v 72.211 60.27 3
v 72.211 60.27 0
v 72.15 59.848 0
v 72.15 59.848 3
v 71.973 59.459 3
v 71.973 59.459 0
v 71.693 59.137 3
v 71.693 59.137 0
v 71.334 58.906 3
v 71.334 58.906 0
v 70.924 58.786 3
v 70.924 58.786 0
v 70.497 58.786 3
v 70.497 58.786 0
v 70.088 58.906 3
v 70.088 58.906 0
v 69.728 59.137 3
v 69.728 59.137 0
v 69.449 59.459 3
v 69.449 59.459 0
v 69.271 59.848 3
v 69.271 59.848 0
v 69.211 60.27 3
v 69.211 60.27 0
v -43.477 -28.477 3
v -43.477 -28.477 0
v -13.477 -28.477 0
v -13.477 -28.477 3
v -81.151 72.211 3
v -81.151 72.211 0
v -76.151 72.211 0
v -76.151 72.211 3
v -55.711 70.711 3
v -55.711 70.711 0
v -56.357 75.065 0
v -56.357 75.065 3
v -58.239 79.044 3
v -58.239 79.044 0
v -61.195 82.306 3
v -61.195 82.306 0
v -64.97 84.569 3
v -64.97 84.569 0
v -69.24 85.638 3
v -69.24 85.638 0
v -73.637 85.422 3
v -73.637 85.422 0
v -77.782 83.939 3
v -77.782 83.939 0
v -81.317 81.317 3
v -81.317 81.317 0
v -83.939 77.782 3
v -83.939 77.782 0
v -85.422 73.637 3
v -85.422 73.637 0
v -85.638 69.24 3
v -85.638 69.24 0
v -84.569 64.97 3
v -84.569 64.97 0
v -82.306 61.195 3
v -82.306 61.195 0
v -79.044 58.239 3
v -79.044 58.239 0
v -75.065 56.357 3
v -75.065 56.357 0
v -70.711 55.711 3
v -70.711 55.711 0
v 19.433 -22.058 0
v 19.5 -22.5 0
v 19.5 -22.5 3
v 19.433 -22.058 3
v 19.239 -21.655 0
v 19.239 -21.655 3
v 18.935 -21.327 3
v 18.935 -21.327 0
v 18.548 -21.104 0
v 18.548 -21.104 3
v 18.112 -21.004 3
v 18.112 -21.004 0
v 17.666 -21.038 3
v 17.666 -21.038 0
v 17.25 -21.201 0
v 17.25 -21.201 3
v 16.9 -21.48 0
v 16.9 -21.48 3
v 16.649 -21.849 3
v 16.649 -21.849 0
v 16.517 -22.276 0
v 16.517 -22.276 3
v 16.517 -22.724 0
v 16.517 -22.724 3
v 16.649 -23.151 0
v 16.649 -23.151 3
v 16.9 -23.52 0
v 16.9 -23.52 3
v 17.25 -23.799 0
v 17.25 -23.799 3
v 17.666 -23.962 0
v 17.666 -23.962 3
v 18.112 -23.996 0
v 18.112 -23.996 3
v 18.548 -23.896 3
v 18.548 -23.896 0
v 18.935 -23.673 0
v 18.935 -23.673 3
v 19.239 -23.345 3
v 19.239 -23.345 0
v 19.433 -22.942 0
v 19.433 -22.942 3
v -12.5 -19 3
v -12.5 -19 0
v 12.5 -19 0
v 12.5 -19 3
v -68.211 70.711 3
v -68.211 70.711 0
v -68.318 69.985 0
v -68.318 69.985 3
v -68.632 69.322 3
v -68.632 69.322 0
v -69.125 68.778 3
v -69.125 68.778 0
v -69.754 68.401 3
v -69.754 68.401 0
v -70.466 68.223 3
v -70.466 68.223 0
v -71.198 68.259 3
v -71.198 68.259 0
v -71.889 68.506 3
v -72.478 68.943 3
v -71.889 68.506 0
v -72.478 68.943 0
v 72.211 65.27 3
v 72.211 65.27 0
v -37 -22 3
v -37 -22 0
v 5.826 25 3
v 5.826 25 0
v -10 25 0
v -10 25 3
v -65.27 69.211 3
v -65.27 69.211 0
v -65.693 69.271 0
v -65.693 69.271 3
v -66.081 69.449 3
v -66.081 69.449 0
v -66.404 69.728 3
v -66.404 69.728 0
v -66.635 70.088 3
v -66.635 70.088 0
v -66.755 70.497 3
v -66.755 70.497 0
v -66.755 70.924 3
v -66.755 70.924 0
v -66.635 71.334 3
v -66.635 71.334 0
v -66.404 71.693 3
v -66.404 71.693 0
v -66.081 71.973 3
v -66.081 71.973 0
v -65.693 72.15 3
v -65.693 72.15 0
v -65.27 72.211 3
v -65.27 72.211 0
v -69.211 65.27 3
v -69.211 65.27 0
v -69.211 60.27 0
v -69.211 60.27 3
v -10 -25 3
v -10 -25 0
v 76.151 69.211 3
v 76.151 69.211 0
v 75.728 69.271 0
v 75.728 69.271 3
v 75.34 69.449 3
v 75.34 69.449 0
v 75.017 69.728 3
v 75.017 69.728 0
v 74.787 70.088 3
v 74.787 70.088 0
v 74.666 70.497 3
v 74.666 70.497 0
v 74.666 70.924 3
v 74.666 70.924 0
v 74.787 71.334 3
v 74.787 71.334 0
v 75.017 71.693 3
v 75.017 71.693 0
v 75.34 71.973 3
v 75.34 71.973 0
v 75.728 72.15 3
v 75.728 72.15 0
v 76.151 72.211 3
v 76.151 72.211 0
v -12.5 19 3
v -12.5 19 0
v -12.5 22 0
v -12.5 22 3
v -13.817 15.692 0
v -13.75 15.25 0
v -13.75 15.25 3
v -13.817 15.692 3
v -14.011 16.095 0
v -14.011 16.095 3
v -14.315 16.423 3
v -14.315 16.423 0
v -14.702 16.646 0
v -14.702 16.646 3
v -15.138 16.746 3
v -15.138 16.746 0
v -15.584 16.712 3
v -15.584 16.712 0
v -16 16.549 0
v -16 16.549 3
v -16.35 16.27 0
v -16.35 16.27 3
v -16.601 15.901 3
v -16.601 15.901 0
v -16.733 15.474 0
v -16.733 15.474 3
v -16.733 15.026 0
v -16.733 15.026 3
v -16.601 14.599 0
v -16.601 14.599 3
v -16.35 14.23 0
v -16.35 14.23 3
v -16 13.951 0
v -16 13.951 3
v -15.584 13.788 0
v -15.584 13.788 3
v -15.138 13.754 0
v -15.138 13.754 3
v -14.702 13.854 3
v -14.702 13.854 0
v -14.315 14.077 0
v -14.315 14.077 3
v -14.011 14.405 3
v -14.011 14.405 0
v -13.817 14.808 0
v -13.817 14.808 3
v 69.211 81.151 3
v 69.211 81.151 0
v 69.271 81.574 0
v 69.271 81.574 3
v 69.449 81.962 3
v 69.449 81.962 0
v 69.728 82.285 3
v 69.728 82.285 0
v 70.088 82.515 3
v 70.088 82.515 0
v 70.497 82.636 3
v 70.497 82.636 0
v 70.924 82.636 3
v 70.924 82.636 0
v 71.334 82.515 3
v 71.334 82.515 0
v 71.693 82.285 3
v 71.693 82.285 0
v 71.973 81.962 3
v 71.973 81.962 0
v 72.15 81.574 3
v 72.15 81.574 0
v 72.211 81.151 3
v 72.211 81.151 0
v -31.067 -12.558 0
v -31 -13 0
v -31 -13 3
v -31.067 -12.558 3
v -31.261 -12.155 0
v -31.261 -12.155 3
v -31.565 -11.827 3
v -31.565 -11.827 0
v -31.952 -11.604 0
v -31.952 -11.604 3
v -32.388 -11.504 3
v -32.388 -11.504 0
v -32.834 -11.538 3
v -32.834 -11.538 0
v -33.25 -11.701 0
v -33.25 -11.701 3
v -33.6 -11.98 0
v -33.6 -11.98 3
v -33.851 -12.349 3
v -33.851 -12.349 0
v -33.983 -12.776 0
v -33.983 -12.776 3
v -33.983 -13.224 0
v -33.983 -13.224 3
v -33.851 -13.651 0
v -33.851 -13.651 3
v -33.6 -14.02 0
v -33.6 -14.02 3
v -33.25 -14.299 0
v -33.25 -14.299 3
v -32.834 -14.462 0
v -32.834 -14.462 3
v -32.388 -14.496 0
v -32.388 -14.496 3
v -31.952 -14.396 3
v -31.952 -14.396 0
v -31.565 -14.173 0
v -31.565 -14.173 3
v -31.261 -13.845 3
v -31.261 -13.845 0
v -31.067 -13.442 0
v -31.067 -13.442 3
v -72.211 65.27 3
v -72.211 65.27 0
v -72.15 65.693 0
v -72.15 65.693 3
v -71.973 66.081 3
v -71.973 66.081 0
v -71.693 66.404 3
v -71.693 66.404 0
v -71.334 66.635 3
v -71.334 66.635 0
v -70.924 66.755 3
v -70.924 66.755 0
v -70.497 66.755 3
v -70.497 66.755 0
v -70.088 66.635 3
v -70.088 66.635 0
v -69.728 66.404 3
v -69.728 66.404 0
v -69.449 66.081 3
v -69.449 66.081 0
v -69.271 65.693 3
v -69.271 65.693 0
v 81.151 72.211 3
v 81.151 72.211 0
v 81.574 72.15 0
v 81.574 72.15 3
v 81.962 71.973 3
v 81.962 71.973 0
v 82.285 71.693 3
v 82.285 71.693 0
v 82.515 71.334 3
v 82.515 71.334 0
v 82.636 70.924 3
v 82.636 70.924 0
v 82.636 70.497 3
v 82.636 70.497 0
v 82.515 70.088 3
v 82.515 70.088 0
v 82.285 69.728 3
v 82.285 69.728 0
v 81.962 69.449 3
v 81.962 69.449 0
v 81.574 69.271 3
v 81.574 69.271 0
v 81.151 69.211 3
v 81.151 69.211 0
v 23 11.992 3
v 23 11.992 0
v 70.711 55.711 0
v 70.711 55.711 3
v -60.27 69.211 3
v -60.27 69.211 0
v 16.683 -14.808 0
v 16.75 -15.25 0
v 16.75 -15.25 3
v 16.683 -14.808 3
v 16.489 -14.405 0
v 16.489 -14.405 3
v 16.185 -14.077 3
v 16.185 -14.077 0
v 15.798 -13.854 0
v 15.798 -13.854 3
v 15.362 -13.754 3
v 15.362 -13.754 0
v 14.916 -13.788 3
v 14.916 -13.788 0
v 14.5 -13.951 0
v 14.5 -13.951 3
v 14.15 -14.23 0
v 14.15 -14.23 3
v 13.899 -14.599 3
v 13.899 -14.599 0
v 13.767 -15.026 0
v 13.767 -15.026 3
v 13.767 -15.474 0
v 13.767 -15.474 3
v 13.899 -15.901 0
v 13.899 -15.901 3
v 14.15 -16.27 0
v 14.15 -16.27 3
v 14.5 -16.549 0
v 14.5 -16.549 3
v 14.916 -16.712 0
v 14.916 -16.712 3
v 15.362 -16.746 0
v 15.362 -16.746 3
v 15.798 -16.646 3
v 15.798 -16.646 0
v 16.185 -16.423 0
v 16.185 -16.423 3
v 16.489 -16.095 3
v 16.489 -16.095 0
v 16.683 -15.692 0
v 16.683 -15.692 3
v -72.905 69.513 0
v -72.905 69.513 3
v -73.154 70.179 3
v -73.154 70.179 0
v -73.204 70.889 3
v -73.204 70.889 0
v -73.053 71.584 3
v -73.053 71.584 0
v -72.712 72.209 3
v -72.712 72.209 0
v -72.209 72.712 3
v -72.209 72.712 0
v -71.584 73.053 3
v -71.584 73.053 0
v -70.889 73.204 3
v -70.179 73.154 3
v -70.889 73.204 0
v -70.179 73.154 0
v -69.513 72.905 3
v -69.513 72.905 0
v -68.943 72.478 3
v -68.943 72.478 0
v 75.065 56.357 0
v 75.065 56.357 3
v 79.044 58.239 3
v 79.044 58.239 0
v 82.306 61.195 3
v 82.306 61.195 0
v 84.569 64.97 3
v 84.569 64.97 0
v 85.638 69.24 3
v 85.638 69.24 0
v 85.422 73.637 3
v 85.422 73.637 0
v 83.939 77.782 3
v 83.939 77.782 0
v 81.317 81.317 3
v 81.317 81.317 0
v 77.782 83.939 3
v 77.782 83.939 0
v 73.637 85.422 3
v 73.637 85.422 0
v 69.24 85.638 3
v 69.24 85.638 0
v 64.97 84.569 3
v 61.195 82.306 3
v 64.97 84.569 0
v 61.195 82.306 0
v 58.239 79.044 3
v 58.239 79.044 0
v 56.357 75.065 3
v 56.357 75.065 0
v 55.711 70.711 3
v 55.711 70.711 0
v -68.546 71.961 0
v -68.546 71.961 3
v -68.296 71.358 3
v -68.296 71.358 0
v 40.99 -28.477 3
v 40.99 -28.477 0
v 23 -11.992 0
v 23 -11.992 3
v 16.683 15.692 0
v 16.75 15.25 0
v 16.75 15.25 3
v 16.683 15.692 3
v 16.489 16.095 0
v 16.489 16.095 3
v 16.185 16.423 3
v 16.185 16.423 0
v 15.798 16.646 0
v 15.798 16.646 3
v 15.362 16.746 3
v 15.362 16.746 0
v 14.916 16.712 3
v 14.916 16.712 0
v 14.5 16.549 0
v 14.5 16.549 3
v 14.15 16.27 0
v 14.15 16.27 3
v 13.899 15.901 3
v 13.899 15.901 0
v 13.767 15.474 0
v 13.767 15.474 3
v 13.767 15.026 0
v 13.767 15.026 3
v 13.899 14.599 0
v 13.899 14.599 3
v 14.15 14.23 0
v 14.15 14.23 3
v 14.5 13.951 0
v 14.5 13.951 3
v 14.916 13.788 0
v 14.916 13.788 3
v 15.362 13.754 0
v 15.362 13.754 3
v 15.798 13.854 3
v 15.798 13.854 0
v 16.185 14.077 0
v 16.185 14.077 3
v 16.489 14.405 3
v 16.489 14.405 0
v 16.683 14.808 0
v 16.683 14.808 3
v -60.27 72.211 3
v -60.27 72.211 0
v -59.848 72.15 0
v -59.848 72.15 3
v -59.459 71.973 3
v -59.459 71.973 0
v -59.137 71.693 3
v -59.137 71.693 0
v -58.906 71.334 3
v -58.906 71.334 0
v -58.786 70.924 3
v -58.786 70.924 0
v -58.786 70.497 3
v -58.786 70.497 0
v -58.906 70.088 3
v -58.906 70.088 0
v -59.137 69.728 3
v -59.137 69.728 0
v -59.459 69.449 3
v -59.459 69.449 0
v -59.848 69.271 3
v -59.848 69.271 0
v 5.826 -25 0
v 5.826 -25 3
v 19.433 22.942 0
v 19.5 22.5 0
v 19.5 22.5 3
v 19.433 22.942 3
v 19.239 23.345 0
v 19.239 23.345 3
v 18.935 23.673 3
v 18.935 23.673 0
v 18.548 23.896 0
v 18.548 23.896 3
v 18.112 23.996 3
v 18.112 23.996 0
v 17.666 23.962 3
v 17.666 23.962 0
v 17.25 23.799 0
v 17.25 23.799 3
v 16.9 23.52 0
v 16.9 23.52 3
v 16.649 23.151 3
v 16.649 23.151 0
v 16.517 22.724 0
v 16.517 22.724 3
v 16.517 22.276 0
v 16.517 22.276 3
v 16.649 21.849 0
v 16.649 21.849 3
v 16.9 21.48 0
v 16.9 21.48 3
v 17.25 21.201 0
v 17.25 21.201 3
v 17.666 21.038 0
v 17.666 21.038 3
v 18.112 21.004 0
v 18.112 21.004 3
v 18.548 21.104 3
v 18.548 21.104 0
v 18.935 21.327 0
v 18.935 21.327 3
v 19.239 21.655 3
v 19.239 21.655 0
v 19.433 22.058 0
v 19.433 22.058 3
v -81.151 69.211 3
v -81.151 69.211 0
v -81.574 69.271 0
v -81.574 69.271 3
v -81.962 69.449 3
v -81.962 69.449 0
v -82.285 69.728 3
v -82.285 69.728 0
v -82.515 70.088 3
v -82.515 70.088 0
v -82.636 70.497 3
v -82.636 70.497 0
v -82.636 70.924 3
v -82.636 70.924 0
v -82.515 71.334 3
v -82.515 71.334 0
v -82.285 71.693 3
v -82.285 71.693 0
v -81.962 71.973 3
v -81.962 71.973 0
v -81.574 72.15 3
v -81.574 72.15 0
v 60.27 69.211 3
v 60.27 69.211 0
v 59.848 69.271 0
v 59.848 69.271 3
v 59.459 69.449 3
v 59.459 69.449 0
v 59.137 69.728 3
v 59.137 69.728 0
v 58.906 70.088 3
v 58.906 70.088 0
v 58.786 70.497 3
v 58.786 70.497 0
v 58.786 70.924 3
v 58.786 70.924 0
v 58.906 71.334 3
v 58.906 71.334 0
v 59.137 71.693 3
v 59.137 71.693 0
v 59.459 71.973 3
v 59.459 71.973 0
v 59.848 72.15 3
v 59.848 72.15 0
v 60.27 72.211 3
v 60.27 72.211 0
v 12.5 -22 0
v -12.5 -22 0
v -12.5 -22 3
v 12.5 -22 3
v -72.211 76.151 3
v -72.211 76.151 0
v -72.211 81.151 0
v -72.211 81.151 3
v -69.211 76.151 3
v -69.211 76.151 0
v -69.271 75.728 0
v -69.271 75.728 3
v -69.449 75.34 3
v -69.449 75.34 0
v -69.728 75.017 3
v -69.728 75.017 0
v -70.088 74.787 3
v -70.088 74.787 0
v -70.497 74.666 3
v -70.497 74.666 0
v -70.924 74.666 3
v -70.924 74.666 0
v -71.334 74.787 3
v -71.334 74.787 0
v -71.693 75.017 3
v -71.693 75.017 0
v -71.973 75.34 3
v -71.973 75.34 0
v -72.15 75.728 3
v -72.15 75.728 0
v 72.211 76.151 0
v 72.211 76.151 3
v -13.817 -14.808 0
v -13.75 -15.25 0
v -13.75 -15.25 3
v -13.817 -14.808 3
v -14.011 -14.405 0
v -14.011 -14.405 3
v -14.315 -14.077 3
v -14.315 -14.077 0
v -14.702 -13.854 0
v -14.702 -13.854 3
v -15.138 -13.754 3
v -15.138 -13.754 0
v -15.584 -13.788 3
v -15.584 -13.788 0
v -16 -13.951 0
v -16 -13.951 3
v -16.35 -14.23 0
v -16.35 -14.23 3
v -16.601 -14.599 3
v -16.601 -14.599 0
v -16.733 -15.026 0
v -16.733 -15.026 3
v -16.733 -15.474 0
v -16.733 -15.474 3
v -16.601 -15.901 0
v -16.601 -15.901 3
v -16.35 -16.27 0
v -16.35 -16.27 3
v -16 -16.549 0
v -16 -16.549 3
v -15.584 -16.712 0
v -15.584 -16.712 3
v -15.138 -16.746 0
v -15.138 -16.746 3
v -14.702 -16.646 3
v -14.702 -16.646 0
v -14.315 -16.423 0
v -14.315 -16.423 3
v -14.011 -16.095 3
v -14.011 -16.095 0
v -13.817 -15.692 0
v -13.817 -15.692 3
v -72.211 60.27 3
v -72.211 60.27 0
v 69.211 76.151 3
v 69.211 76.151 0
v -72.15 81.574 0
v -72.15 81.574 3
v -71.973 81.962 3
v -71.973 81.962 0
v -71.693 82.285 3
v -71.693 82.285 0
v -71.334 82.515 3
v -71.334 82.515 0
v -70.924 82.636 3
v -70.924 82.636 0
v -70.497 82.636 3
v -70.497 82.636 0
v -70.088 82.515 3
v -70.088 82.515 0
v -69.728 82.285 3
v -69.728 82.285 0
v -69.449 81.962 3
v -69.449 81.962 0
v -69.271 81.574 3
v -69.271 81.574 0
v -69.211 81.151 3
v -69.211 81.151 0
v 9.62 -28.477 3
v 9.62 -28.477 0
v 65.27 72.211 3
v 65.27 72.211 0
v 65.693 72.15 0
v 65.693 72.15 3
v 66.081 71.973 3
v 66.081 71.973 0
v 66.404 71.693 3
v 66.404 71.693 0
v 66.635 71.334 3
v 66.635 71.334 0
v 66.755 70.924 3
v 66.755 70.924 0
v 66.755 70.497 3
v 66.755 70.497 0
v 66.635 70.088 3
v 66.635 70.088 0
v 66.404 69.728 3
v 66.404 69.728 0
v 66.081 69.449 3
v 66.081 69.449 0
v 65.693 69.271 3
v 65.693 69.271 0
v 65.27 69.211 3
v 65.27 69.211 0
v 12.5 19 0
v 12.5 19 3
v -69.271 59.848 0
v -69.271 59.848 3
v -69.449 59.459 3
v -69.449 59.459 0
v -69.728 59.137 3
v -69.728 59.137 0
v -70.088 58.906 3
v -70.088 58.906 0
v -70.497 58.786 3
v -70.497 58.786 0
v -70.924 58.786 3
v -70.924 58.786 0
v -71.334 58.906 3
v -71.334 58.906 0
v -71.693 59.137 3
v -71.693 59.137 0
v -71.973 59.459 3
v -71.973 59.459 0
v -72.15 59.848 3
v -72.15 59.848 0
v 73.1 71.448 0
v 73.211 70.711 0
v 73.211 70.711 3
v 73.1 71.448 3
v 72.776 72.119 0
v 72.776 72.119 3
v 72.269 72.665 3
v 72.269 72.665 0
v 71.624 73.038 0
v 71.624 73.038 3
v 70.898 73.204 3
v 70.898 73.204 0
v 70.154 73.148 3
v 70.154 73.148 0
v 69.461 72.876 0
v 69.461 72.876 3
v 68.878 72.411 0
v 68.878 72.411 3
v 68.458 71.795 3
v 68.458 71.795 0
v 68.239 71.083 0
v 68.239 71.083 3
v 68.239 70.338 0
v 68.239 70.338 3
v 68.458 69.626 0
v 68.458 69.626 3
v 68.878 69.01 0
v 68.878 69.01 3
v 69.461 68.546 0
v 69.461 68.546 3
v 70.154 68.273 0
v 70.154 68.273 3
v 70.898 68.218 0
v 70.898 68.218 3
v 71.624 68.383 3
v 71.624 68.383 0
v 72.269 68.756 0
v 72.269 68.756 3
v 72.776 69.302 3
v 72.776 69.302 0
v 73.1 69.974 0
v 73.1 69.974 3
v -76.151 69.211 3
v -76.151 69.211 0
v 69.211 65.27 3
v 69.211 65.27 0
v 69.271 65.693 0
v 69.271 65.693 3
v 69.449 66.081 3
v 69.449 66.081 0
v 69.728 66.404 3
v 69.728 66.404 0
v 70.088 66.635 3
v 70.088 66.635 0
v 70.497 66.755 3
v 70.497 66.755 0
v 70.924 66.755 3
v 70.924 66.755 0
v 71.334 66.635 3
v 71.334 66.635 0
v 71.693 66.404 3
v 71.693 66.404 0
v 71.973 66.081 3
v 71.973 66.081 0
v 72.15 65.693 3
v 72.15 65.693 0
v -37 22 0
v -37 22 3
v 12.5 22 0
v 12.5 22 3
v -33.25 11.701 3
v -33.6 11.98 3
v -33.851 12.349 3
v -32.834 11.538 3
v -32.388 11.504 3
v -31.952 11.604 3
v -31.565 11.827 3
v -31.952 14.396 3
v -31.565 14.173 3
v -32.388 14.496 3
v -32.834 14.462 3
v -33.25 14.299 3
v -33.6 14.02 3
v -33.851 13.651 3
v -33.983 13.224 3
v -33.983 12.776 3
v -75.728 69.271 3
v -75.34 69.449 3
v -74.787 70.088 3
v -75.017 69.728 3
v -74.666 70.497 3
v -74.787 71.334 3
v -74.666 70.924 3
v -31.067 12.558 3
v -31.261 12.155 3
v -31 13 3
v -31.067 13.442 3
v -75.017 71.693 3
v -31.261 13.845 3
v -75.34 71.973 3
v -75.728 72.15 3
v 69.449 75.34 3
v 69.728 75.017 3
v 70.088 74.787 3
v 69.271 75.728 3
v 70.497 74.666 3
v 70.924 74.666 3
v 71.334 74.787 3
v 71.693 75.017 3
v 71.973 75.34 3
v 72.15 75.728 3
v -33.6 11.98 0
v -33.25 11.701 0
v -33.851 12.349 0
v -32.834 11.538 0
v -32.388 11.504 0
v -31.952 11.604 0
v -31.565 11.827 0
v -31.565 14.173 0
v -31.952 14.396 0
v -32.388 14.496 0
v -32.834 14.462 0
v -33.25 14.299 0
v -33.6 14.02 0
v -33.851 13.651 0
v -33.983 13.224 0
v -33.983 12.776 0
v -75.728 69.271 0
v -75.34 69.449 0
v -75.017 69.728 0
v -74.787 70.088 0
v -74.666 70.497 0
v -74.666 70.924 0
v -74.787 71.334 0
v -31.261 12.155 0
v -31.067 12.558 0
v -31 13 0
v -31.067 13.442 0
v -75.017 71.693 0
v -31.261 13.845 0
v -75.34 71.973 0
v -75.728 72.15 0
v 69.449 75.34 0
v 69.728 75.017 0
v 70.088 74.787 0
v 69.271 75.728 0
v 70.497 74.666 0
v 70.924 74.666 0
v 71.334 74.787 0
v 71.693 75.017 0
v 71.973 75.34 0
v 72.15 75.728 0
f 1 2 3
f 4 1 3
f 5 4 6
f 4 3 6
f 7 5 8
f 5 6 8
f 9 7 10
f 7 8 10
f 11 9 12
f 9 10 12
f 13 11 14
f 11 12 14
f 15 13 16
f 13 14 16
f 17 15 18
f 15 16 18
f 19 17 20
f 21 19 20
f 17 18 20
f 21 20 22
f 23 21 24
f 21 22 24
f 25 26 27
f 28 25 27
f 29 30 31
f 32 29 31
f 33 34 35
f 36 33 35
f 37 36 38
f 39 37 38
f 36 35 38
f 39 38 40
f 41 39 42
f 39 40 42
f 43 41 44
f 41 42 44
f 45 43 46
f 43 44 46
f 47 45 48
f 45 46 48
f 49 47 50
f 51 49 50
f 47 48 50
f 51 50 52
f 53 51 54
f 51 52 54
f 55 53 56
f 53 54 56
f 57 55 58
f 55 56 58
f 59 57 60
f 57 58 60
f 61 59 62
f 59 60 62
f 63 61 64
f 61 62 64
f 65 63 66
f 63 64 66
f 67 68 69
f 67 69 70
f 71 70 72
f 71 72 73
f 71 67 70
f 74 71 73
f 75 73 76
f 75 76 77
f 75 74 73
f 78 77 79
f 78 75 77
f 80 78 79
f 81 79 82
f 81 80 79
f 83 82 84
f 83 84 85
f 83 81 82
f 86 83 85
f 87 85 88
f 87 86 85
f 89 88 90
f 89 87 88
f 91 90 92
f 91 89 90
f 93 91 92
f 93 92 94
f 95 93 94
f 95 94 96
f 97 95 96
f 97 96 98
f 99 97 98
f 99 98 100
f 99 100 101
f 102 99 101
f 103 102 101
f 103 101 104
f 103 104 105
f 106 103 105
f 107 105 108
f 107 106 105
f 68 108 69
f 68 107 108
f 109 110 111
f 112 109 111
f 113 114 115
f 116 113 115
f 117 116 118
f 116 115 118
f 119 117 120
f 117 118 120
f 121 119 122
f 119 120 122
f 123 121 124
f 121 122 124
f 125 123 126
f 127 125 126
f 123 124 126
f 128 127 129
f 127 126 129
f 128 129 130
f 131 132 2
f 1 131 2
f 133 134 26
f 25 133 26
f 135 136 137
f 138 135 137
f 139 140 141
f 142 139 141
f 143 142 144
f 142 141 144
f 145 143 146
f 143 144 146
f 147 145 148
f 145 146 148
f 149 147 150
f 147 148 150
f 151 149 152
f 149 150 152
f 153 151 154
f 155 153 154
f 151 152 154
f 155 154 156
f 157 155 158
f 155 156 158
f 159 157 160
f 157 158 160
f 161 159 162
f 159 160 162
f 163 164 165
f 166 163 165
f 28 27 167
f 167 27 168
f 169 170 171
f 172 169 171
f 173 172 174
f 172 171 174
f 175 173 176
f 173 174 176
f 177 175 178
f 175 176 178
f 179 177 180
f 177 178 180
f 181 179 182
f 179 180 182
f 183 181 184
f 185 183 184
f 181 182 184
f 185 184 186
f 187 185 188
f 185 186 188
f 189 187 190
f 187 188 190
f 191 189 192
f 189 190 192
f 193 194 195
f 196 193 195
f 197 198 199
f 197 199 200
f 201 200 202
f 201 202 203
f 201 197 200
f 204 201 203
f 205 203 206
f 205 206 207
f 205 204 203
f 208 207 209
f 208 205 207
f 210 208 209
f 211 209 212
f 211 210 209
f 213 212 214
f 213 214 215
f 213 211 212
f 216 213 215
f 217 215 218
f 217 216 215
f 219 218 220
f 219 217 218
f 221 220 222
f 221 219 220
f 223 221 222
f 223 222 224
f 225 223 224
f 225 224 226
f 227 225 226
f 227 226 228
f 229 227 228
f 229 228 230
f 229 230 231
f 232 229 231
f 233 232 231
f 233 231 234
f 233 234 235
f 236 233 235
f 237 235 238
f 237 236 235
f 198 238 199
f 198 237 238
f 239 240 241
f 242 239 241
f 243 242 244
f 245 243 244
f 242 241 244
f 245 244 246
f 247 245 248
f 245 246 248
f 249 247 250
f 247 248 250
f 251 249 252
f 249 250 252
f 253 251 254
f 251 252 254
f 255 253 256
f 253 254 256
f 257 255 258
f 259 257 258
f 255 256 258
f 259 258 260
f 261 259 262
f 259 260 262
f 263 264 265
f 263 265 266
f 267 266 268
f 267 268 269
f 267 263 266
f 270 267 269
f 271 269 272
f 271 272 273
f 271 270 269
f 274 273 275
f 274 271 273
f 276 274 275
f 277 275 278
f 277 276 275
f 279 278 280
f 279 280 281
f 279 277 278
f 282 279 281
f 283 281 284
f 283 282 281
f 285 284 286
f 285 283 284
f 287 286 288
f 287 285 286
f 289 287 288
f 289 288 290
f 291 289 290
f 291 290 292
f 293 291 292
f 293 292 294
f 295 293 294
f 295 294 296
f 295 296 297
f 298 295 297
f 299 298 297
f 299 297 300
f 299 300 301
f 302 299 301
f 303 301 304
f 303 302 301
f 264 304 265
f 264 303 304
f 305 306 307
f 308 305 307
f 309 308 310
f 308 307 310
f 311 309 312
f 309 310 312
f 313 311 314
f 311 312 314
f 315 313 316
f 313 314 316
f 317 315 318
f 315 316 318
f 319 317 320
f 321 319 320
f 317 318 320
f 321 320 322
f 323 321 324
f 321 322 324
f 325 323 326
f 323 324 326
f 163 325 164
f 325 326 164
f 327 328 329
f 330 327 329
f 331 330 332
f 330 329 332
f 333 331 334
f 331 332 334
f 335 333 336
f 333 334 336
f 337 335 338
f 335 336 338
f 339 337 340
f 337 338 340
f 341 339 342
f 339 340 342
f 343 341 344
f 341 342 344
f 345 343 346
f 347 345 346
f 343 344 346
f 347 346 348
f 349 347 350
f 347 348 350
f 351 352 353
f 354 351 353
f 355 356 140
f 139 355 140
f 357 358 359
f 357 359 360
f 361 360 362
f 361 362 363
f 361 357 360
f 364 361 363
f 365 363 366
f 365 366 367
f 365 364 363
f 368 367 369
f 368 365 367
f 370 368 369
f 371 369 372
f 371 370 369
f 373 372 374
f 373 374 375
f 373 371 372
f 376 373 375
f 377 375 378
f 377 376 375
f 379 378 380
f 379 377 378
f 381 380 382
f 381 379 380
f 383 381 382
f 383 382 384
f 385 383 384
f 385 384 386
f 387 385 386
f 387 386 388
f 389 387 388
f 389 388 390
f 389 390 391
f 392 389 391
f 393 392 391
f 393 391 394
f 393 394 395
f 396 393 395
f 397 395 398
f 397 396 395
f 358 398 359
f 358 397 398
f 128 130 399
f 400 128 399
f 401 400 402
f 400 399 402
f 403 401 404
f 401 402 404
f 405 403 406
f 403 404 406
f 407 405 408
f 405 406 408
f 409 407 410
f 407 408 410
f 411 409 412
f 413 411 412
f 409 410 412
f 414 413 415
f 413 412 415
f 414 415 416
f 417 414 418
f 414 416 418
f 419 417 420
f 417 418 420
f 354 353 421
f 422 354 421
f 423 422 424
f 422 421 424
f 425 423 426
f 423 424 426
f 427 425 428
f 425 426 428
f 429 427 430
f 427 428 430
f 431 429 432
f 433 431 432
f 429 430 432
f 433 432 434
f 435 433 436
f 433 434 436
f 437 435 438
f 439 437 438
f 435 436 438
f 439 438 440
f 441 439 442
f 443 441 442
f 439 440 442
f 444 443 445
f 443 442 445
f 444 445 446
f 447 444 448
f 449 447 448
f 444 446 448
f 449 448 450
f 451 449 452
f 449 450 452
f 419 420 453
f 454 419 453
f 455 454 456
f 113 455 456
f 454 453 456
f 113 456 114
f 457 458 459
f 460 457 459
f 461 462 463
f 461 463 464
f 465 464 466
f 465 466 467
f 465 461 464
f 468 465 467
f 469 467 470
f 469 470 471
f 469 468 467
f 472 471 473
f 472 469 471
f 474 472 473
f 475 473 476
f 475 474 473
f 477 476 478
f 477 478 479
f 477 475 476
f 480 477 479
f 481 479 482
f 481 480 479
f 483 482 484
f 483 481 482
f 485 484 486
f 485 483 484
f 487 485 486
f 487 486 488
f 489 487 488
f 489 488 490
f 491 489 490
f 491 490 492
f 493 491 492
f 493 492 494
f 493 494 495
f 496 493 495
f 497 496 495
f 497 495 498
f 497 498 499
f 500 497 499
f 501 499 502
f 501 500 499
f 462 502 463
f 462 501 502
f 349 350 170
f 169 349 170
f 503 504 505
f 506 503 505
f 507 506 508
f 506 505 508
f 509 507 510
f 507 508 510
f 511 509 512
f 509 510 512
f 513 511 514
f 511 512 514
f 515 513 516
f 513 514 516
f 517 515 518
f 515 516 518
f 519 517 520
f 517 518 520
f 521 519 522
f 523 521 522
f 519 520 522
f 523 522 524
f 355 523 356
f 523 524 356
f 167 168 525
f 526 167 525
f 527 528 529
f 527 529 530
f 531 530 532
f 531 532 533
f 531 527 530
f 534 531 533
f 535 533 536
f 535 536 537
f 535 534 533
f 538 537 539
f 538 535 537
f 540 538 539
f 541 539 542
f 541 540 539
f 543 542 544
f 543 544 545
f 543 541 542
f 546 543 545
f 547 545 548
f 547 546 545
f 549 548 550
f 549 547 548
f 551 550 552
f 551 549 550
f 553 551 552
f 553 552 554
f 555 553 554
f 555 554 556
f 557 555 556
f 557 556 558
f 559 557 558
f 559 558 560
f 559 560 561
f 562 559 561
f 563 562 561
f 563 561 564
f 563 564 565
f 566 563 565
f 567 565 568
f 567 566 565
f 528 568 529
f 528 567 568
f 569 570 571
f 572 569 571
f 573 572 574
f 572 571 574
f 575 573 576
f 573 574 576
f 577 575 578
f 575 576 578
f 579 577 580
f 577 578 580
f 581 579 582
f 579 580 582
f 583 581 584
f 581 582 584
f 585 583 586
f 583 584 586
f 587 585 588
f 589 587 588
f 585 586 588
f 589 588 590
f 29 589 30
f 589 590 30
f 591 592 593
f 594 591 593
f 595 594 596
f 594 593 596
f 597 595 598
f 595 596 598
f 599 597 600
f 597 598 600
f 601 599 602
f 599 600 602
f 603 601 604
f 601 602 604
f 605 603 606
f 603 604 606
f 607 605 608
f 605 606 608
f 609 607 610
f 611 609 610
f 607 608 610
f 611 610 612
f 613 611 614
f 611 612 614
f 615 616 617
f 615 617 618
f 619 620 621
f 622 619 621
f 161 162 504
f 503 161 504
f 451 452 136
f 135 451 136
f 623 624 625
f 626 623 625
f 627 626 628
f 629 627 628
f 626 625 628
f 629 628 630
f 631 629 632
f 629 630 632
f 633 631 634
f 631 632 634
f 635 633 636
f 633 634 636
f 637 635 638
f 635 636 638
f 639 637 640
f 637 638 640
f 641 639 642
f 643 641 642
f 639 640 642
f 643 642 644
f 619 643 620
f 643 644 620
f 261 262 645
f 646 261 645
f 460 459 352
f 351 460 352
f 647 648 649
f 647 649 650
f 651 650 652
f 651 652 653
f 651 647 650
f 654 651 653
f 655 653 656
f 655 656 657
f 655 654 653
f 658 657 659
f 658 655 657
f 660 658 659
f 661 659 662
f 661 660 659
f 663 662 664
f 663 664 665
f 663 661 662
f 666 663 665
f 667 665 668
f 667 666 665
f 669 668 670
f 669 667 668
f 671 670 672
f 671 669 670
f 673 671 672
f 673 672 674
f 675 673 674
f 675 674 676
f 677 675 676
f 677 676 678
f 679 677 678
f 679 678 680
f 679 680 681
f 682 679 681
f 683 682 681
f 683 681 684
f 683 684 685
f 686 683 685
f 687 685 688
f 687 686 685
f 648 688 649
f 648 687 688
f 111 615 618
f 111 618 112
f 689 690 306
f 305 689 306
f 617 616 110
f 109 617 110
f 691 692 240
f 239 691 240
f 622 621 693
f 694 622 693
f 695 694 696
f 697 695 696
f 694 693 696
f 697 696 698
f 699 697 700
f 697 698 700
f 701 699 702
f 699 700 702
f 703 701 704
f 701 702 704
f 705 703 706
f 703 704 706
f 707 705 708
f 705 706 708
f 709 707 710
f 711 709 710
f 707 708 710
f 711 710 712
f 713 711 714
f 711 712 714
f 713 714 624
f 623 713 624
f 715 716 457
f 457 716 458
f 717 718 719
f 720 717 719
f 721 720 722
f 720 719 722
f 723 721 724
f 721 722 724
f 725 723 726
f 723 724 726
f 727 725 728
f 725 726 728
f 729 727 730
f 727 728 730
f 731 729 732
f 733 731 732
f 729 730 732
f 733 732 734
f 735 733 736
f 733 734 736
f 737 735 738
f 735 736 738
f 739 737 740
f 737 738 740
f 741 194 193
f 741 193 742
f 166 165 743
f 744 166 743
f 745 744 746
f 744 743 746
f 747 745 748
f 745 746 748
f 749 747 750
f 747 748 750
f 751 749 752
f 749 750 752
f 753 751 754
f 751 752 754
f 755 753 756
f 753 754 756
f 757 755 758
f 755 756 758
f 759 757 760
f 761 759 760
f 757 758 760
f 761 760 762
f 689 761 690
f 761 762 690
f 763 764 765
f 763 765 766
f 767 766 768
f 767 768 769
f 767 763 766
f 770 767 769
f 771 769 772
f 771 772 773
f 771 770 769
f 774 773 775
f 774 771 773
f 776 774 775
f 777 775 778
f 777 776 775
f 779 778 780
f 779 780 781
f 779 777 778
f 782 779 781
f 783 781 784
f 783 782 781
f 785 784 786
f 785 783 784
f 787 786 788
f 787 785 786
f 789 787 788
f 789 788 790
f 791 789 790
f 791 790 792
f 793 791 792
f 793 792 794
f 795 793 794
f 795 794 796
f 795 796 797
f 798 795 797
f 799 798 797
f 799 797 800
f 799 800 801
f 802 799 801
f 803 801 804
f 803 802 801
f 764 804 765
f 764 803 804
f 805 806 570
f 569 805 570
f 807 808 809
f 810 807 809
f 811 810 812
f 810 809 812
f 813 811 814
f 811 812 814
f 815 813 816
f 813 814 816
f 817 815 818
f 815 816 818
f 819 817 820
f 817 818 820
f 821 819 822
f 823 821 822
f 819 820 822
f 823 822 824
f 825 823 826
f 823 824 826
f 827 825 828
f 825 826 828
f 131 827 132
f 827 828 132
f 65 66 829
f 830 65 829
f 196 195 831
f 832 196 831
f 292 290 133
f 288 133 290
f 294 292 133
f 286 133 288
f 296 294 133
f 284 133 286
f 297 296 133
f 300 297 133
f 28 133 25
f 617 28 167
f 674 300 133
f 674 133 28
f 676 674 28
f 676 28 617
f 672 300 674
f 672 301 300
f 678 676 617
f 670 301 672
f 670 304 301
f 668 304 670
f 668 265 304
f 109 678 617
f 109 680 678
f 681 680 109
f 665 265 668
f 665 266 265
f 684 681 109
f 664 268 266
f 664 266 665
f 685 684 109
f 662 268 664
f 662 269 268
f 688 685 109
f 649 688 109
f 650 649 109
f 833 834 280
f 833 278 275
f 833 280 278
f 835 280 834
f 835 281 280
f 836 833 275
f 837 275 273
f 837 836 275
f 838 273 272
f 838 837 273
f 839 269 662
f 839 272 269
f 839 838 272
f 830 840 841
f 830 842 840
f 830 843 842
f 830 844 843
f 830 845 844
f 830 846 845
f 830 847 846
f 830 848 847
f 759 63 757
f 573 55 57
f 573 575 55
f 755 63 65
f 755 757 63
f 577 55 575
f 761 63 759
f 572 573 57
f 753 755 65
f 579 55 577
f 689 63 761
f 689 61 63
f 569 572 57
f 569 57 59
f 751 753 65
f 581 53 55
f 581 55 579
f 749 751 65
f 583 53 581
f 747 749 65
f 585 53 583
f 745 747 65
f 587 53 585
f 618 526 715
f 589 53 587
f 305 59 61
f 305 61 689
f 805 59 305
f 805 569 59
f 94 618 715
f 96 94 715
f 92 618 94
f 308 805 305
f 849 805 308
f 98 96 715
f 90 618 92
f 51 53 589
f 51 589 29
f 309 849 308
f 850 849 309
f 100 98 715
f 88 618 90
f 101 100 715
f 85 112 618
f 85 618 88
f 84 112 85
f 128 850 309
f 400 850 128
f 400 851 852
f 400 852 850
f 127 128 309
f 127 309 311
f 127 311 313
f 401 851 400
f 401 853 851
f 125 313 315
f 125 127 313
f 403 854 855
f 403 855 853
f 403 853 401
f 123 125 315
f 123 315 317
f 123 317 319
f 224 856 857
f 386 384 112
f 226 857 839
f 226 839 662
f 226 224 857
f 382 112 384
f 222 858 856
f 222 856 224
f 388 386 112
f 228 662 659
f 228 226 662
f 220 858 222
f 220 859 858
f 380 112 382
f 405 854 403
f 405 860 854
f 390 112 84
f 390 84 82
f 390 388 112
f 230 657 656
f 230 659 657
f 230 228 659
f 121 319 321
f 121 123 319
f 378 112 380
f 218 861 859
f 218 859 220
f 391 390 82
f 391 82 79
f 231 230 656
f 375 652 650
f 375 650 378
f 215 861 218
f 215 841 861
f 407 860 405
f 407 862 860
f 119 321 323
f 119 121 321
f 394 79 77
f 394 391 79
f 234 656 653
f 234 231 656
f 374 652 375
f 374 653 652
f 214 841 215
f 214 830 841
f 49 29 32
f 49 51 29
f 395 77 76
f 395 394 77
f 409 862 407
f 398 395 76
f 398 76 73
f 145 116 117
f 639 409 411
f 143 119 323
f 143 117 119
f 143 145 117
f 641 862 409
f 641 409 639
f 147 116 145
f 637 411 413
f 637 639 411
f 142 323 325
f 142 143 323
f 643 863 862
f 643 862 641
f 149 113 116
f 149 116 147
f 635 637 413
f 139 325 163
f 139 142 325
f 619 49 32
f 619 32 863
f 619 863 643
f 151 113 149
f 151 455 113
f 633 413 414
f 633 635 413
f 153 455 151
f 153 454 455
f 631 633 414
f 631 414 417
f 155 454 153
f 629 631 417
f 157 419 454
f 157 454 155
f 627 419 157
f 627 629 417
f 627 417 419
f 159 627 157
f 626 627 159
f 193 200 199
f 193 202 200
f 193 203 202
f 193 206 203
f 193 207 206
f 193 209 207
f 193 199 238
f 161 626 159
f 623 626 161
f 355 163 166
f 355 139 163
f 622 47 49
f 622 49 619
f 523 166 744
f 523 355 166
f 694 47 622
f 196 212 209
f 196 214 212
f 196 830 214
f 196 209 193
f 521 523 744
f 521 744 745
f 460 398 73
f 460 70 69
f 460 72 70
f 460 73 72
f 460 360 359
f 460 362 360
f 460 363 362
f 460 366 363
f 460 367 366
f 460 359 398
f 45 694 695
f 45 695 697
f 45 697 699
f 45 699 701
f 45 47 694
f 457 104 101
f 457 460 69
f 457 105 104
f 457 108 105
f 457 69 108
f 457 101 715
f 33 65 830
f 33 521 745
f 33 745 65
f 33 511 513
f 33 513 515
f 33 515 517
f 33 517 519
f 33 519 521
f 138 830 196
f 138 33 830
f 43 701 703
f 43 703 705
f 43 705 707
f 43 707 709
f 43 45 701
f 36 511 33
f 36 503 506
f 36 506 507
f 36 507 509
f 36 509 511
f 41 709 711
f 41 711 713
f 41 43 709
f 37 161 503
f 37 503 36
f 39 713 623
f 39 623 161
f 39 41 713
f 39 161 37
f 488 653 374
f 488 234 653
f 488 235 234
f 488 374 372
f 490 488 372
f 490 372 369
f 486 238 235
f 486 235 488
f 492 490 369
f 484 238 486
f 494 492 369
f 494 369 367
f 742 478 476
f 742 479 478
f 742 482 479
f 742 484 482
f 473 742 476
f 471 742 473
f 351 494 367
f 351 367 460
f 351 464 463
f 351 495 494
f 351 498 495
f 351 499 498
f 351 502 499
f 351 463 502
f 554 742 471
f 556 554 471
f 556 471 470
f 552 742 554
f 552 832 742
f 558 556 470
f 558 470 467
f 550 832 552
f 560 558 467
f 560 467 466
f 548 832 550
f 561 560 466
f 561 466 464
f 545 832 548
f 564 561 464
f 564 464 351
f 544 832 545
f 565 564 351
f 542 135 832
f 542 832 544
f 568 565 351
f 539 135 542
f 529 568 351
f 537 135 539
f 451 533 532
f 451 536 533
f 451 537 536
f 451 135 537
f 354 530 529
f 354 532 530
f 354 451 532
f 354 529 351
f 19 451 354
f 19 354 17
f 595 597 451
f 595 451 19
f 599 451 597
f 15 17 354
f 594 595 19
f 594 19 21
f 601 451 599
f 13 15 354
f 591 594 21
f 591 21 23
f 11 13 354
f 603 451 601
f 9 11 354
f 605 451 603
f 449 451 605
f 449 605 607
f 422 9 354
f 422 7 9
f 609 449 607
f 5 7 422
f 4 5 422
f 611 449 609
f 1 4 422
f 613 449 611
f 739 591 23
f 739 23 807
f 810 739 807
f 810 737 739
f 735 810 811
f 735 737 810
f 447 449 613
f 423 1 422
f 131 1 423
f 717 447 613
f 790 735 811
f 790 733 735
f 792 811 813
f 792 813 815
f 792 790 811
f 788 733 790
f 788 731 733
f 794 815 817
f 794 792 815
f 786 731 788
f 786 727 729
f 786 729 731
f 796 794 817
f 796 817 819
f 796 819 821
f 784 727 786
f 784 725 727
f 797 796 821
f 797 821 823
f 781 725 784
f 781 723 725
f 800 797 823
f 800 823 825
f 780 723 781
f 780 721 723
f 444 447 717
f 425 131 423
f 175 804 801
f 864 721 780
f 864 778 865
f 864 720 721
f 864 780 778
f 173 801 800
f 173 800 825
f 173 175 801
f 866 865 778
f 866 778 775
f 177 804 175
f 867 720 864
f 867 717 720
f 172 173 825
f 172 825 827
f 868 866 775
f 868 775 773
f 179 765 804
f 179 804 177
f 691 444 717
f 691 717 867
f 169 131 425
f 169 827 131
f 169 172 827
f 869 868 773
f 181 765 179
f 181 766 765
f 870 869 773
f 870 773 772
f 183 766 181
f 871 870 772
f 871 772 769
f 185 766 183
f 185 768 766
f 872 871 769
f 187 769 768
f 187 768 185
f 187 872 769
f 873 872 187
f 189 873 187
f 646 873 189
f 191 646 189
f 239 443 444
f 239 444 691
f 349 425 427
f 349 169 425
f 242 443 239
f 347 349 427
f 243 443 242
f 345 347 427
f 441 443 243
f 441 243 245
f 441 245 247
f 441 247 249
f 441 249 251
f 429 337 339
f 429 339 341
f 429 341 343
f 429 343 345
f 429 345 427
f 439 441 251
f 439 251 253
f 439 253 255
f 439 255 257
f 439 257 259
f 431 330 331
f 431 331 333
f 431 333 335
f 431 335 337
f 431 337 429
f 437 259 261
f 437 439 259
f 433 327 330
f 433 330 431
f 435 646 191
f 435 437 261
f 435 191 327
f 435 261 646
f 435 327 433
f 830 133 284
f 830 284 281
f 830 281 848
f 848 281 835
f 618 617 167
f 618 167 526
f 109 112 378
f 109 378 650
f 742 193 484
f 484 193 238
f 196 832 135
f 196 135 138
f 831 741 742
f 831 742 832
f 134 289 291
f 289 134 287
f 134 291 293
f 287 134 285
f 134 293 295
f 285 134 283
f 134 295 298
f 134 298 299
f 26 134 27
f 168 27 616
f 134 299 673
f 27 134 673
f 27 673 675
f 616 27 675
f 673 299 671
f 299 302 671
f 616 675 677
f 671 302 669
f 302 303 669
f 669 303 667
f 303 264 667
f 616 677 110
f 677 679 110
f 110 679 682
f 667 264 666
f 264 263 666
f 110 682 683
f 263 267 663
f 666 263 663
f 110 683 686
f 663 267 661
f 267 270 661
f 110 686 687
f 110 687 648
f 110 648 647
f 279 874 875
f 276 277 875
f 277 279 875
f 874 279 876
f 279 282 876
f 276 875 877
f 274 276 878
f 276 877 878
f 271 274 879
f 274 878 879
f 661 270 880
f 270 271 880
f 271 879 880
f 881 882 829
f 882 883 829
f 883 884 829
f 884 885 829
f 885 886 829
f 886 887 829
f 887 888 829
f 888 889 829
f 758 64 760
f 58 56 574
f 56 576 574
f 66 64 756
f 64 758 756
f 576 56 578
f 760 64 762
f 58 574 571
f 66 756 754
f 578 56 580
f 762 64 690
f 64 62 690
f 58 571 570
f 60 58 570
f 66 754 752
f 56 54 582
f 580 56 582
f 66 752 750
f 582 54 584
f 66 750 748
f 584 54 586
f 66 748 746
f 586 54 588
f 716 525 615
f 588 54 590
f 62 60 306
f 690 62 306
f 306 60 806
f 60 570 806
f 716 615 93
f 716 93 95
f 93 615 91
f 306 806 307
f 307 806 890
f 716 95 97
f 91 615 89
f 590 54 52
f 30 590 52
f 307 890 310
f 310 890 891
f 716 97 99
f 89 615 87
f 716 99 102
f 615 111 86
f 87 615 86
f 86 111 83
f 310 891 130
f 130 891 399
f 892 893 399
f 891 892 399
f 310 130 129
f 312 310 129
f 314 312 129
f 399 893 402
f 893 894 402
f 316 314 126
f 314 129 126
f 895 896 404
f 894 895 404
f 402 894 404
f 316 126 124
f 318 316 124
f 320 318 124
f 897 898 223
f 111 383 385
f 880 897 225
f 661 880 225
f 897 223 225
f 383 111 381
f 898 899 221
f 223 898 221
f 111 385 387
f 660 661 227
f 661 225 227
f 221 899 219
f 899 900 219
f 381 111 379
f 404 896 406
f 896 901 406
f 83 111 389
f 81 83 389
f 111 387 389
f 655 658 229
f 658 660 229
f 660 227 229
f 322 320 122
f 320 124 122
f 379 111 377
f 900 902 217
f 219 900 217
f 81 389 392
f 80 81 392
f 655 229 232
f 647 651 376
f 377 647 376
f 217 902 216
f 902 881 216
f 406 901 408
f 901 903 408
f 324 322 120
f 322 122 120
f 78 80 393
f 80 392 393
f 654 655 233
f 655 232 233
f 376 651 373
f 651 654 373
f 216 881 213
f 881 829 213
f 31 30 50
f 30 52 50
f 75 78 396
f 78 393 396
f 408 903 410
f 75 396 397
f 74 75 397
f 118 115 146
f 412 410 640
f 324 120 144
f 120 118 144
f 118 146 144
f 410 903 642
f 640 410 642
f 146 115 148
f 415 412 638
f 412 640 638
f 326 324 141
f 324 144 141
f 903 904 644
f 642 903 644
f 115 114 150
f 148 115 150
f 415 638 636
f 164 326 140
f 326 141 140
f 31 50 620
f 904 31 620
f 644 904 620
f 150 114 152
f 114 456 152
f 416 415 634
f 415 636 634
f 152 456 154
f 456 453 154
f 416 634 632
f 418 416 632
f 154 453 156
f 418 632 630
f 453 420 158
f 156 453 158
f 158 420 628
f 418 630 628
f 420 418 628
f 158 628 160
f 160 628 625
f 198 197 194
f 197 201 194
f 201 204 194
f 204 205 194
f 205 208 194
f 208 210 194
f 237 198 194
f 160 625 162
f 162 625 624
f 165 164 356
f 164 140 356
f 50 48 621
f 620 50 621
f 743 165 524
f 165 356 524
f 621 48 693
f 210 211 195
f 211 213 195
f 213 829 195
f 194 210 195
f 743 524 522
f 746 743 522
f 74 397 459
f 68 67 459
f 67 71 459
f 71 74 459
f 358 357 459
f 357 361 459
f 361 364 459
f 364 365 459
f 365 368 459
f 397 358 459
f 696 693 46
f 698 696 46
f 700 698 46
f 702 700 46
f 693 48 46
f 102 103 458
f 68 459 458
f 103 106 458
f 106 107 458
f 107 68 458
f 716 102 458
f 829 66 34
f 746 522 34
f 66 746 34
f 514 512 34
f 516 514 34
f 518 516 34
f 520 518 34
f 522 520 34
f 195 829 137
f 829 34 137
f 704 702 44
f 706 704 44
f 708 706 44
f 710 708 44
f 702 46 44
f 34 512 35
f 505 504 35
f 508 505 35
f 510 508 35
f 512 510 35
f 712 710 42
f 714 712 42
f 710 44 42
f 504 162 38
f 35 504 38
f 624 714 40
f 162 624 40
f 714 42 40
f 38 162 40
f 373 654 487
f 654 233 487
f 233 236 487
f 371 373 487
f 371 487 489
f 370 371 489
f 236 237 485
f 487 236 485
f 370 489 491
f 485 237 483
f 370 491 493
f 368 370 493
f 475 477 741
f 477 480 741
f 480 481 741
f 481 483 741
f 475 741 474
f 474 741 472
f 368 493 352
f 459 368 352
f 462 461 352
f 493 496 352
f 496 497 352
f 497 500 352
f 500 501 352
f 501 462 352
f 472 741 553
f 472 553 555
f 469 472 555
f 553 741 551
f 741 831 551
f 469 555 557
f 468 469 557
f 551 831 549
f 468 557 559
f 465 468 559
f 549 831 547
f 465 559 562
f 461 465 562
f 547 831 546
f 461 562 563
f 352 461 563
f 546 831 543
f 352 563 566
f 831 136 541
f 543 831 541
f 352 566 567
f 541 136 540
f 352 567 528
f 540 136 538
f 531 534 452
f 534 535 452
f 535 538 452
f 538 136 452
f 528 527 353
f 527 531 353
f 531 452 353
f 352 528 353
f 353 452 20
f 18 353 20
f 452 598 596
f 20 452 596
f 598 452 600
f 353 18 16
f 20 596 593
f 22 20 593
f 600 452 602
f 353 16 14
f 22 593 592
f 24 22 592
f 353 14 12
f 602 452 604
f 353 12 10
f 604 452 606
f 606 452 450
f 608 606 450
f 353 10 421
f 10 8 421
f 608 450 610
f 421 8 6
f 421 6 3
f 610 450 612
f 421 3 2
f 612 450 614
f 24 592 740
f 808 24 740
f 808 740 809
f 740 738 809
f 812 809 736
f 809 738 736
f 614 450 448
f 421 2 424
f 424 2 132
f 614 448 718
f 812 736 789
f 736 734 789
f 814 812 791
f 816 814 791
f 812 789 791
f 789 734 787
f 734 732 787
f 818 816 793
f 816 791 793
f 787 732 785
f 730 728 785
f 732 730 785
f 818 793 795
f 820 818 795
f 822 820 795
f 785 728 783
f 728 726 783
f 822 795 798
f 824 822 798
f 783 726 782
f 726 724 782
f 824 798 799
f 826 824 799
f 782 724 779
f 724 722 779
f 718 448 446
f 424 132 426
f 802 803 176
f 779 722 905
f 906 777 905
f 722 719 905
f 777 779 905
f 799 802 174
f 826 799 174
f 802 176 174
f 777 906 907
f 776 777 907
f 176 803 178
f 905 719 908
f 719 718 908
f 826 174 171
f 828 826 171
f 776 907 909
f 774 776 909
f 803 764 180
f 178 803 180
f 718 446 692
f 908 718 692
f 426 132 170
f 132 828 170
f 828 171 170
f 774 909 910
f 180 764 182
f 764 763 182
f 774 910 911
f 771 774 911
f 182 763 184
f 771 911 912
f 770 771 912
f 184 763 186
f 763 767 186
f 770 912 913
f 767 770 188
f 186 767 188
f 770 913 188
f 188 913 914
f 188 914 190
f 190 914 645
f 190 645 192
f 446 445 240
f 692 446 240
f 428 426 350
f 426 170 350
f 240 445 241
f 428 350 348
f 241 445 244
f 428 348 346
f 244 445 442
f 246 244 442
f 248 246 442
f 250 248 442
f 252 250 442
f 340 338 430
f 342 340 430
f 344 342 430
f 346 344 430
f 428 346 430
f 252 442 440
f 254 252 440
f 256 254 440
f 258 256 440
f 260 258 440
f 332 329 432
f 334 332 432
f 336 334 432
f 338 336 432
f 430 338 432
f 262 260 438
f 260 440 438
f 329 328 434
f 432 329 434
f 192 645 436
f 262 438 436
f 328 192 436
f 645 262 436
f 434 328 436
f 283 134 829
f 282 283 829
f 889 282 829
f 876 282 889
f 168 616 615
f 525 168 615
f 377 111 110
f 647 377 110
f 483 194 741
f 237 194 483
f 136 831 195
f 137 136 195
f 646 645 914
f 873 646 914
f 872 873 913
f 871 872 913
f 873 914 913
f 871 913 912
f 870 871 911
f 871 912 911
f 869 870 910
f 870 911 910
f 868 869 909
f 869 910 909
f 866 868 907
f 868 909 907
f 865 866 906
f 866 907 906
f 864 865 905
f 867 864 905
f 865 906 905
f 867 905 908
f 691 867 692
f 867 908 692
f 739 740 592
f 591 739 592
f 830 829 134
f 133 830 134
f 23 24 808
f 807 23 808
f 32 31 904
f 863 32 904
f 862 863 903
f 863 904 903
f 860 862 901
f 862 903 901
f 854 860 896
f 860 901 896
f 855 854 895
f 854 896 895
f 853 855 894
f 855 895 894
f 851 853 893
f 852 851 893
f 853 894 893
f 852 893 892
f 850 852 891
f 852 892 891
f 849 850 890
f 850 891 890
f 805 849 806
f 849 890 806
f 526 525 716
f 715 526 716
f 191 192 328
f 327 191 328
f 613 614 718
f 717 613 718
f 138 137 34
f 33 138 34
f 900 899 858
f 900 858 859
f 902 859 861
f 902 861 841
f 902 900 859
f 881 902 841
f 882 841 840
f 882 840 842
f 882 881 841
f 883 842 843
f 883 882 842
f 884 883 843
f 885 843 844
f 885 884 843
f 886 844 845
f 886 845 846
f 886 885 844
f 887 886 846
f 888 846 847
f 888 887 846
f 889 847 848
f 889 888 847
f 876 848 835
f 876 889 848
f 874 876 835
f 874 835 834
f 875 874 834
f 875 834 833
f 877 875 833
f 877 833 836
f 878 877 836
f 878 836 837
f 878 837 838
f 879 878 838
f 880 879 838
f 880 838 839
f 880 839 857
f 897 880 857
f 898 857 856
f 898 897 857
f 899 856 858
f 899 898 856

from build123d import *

# Parameters (mm, degrees)
F0_R     = 1.5
F0_W     = 25
F0_H     = 3
F0_R_2   = 2.5
F1_DEPTH = 3


# Not quite as in the source:
# - ends of sketch curves that miss each other by under 0.0002 mm in the source are joined


with BuildPart() as f1:
    # F0 (on Top) → F1 (new body)
    with BuildSketch(Plane.XY):
        with BuildLine():
            Line((-10.0000000587, 25), (-55.7106781187, 70.7106779065))
            ThreePointArc((-55.7106781187, 70.7106779065), (-81.3172799026, 81.3172797703), (-70.7106779065, 55.7106781187))
            Line((-70.7106779065, 55.7106781187), (-37, 22.0000003253))
            Line((-37, 22.0000003253), (-37, -22.0000003253))
            Line((-37, -22.0000003253), (-43.4767450368, -28.4767453404))
            Line((-43.4767450368, -28.4767453404), (-13.4767454108, -28.4767453404))
            Line((-13.4767454108, -28.4767453404), (-10.0000000587, -25))
            Line((-10.0000000587, -25), (5.8262266936, -25))
            Line((5.8262266936, -25), (9.6204284269, -28.4767453404))
            Line((9.6204284269, -28.4767453404), (40.9900556349, -28.4767453404))
            Line((40.9900556349, -28.4767453404), (23, -11.9918965954))
            Line((23, -11.9918965954), (23, 11.9918965954))
            Line((23, 11.9918965954), (70.7106780935, 55.7106781187))
            ThreePointArc((70.7106780935, 55.7106781187), (81.3172798365, 81.3172798365), (55.7106781187, 70.7106779065))
            Line((55.7106781187, 70.7106779065), (5.8262266936, 25))
            Line((5.8262266936, 25), (-10.0000000587, 25))
        make_face()
        with Locations((-15.25, -15.25)):
            Circle(F0_R, mode=Mode.SUBTRACT)
        with Locations((-32.5, -13)):
            Circle(F0_R, mode=Mode.SUBTRACT)
        with Locations((-32.5, 13)):
            Circle(F0_R, mode=Mode.SUBTRACT)
        with Locations((-15.25, 15.25)):
            Circle(F0_R, mode=Mode.SUBTRACT)
        with Locations((18, -22.5)):
            Circle(F0_R, mode=Mode.SUBTRACT)
        with Locations((0, -20.5)):
            Rectangle(F0_W, F0_H, mode=Mode.SUBTRACT)
        with Locations((15.25, -15.25)):
            Circle(F0_R, mode=Mode.SUBTRACT)
        with Locations((0, 20.5)):
            Rectangle(F0_W, F0_H, mode=Mode.SUBTRACT)
        with Locations((15.25, 15.25)):
            Circle(F0_R, mode=Mode.SUBTRACT)
        with Locations((18, 22.5)):
            Circle(F0_R, mode=Mode.SUBTRACT)
        with BuildLine():
            ThreePointArc((-72.2106780183, 65.2703154499), (-70.7106780132, 66.7703154448), (-69.2106780183, 65.2703154398))
            Line((-69.2106780183, 65.2703154398), (-69.210678035, 60.2703154398))
            ThreePointArc((-69.210678035, 60.2703154398), (-70.7106780401, 58.7703154448), (-72.210678035, 60.2703154499))
            Line((-72.210678035, 60.2703154499), (-72.2106780183, 65.2703154499))
        make_face(mode=Mode.SUBTRACT)
        with BuildLine():
            ThreePointArc((-76.1510407975, 72.2106782191), (-74.6510407925, 70.7106782241), (-76.1510407874, 69.2106782191))
            Line((-76.1510407874, 69.2106782191), (-81.1510407874, 69.2106782023))
            ThreePointArc((-81.1510407874, 69.2106782023), (-82.6510407925, 70.7106781972), (-81.1510407975, 72.2106782023))
            Line((-81.1510407975, 72.2106782023), (-76.1510407975, 72.2106782191))
        make_face(mode=Mode.SUBTRACT)
        with BuildLine():
            ThreePointArc((-68.9429111657, 72.4784450716), (-68.4009792874, 71.6673866996), (-68.2106781187, 70.7106781187))
            ThreePointArc((-68.2106781187, 70.7106781187), (-69.7539695377, 68.4009792874), (-72.4784450716, 68.9429111657))
            ThreePointArc((-72.4784450716, 68.9429111657), (-72.4784450716, 72.4784450716), (-68.9429111657, 72.4784450716))
        make_face(mode=Mode.SUBTRACT)
        with BuildLine():
            Line((-60.2703154398, 69.210678035), (-65.2703154398, 69.2106780183))
            ThreePointArc((-65.2703154398, 69.2106780183), (-66.7703154448, 70.7106780132), (-65.2703154499, 72.2106780183))
            Line((-65.2703154499, 72.2106780183), (-60.2703154499, 72.210678035))
            ThreePointArc((-60.2703154499, 72.210678035), (-58.7703154448, 70.7106780401), (-60.2703154398, 69.210678035))
        make_face(mode=Mode.SUBTRACT)
        with BuildLine():
            Line((-69.210678, 81.1510407925), (-69.210678, 76.1510407925))
            ThreePointArc((-69.210678, 76.1510407925), (-70.710678, 74.6510407925), (-72.210678, 76.1510407925))
            Line((-72.210678, 76.1510407925), (-72.210678, 81.1510407925))
            ThreePointArc((-72.210678, 81.1510407925), (-70.710678, 82.6510407925), (-69.210678, 81.1510407925))
        make_face(mode=Mode.SUBTRACT)
        with BuildLine():
            ThreePointArc((65.2703154499, 72.2106780183), (66.7703154448, 70.7106780132), (65.2703154398, 69.2106780183))
            Line((65.2703154398, 69.2106780183), (60.2703154398, 69.210678035))
            ThreePointArc((60.2703154398, 69.210678035), (58.7703154448, 70.7106780401), (60.2703154499, 72.210678035))
            Line((60.2703154499, 72.210678035), (65.2703154499, 72.2106780183))
        make_face(mode=Mode.SUBTRACT)
        with BuildLine():
            Line((69.210678035, 60.2703154398), (69.2106780183, 65.2703154398))
            ThreePointArc((69.2106780183, 65.2703154398), (70.7106780132, 66.7703154448), (72.2106780183, 65.2703154499))
            Line((72.2106780183, 65.2703154499), (72.210678035, 60.2703154499))
            ThreePointArc((72.210678035, 60.2703154499), (70.7106780401, 58.7703154448), (69.210678035, 60.2703154398))
        make_face(mode=Mode.SUBTRACT)
        with Locations((70.7106781187, 70.7106781187)):
            Circle(F0_R_2, mode=Mode.SUBTRACT)
        with BuildLine():
            Line((81.1510407874, 69.2106782023), (76.1510407874, 69.2106782191))
            ThreePointArc((76.1510407874, 69.2106782191), (74.6510407925, 70.7106782241), (76.1510407975, 72.2106782191))
            Line((76.1510407975, 72.2106782191), (81.1510407975, 72.2106782023))
            ThreePointArc((81.1510407975, 72.2106782023), (82.6510407925, 70.7106781972), (81.1510407874, 69.2106782023))
        make_face(mode=Mode.SUBTRACT)
        with BuildLine():
            Line((72.210678, 81.1510407925), (72.210678, 76.1510407925))
            ThreePointArc((72.210678, 76.1510407925), (70.710678, 74.6510407925), (69.210678, 76.1510407925))
            Line((69.210678, 76.1510407925), (69.210678, 81.1510407925))
            ThreePointArc((69.210678, 81.1510407925), (70.710678, 82.6510407925), (72.210678, 81.1510407925))
        make_face(mode=Mode.SUBTRACT)
    extrude(amount=F1_DEPTH)


solid = f1.part
